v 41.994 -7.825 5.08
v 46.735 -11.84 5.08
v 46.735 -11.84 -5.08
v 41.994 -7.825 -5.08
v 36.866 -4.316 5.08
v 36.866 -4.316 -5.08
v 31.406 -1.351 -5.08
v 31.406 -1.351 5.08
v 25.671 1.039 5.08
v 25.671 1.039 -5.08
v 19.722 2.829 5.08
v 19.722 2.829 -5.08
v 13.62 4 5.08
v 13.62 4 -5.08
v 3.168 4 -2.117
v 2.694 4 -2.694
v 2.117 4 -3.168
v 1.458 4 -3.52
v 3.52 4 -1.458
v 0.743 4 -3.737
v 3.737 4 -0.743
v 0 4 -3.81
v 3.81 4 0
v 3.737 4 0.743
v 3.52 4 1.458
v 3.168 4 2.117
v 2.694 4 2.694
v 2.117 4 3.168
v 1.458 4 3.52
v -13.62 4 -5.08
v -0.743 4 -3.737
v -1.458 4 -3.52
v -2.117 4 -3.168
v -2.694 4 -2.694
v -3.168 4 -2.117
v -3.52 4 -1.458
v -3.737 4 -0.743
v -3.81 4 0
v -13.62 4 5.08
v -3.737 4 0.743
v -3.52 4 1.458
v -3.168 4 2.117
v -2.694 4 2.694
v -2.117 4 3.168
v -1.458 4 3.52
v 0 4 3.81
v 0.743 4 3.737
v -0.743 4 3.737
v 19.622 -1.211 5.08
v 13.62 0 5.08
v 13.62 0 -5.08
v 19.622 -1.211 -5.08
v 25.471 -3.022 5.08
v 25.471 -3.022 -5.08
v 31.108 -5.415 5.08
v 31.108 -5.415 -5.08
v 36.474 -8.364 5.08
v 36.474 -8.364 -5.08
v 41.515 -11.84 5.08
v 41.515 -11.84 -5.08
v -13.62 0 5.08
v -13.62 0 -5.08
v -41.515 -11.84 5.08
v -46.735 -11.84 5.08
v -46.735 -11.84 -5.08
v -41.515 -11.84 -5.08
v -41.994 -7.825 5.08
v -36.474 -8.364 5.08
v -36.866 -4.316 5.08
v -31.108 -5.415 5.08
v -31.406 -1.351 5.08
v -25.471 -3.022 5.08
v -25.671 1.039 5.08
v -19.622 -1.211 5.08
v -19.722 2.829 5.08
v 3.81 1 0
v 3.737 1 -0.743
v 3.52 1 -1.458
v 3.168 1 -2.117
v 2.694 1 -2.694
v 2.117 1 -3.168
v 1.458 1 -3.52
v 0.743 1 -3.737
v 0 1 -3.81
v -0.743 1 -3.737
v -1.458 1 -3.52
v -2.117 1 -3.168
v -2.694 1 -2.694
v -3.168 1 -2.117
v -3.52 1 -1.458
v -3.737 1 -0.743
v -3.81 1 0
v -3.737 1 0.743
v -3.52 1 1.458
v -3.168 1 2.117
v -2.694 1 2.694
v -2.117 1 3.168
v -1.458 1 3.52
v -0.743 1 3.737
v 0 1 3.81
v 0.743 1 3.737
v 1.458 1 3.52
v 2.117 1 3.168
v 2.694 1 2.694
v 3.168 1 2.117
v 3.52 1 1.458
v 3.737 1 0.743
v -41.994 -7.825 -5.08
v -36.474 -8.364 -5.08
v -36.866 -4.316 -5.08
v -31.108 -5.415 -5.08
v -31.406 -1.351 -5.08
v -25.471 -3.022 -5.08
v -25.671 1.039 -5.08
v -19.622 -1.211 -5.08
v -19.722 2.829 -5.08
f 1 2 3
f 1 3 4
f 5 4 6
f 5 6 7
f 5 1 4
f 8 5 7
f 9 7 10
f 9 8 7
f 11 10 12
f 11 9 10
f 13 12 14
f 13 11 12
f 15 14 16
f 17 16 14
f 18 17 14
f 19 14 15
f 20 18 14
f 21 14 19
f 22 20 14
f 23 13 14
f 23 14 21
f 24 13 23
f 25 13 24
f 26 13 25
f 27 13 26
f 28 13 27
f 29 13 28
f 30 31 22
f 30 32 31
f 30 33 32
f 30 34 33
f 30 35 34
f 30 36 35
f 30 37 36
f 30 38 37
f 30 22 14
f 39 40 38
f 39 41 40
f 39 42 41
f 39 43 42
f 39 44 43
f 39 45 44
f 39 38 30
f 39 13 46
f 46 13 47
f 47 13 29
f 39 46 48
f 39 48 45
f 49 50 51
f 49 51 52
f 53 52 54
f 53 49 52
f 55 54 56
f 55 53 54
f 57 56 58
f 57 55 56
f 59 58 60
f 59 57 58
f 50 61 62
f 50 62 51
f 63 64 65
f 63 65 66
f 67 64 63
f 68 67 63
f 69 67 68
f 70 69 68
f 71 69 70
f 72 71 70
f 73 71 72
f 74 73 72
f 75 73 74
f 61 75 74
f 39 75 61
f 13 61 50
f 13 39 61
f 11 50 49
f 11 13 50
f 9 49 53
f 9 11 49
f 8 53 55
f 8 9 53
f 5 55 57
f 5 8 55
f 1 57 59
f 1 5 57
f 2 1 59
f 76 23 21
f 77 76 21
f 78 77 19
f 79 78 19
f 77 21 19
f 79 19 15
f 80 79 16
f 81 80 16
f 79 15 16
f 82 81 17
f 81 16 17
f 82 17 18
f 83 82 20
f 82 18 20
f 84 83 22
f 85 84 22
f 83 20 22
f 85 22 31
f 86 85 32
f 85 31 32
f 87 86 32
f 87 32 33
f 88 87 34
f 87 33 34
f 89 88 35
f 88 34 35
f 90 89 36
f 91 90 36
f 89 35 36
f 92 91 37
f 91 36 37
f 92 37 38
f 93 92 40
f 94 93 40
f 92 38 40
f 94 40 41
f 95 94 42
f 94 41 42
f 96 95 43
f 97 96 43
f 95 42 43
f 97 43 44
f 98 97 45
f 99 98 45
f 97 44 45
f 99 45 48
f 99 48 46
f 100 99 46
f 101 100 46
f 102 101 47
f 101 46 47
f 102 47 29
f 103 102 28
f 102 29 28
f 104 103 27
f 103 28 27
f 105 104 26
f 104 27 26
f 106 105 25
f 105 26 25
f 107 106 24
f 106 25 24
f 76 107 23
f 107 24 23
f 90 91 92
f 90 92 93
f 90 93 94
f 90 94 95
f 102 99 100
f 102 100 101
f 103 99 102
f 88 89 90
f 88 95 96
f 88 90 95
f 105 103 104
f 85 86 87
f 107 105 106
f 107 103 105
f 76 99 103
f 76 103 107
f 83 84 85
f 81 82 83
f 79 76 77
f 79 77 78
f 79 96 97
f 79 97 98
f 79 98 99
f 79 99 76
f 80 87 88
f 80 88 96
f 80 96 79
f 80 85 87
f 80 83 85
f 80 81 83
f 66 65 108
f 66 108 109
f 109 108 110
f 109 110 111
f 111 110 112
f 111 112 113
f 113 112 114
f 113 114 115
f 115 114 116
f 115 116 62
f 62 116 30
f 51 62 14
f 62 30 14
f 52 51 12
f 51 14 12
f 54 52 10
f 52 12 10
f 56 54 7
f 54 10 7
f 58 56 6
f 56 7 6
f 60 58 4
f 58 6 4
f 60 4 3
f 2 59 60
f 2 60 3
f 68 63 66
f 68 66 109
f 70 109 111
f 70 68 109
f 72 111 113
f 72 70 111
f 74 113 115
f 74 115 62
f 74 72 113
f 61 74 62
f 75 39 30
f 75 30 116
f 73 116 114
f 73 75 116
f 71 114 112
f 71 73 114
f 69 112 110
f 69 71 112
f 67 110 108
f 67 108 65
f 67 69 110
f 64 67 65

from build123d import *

# Parameters (mm, degrees)
SKETCH1_W           = 15.24
SKETCH1_H           = 10.16
BOSS_EXTRUDE1_DEPTH = 4
SKETCH2_R           = 3.81
CUT_EXTRUDE1_DEPTH  = 3
BOSS_EXTRUDE2_DEPTH = 10.16


with BuildPart() as part:
    # Sketch1 → Boss-Extrude1 (new body)
    with BuildSketch(Plane(origin=(0, 0, 0), x_dir=(1, 0, 0), z_dir=(0, 1, 0))):
        Rectangle(SKETCH1_W, SKETCH1_H)
    extrude(amount=BOSS_EXTRUDE1_DEPTH)

    # Sketch2 → Cut-Extrude1 (cut)
    with BuildSketch(Plane(origin=(0, 4, 0), x_dir=(1, 0, 0), z_dir=(0, 1, 0))):
        Circle(SKETCH2_R)
    extrude(amount=-CUT_EXTRUDE1_DEPTH, mode=Mode.SUBTRACT)

    # Sketch3 → Boss-Extrude2 (add)
    with BuildSketch(Plane.XY.offset(5.08)):
        with BuildLine():
            Line((13.62, 4), (7.62, 4))
            Line((7.62, 4), (7.62, 0))
            Line((7.62, 0), (13.62, 0))
            ThreePointArc((13.62, 0), (28.319939798, -4.147298344), (41.51503945, -11.84))
            Line((41.51503945, -11.84), (46.73503945, -11.84))
            ThreePointArc((46.73503945, -11.84), (31.406388408, -1.350932139), (13.62, 4))
        make_face()
        with BuildLine():
            ThreePointArc((-13.62, 4), (-31.406388408, -1.350932139), (-46.73503945, -11.84))
            Line((-46.73503945, -11.84), (-41.51503945, -11.84))
            ThreePointArc((-41.51503945, -11.84), (-28.319939798, -4.147298344), (-13.62, 0))
            Line((-13.62, 0), (-7.62, 0))
            Line((-7.62, 0), (-7.62, 4))
            Line((-7.62, 4), (-13.62, 4))
        make_face()
    extrude(amount=-BOSS_EXTRUDE2_DEPTH)


solid = part.part
